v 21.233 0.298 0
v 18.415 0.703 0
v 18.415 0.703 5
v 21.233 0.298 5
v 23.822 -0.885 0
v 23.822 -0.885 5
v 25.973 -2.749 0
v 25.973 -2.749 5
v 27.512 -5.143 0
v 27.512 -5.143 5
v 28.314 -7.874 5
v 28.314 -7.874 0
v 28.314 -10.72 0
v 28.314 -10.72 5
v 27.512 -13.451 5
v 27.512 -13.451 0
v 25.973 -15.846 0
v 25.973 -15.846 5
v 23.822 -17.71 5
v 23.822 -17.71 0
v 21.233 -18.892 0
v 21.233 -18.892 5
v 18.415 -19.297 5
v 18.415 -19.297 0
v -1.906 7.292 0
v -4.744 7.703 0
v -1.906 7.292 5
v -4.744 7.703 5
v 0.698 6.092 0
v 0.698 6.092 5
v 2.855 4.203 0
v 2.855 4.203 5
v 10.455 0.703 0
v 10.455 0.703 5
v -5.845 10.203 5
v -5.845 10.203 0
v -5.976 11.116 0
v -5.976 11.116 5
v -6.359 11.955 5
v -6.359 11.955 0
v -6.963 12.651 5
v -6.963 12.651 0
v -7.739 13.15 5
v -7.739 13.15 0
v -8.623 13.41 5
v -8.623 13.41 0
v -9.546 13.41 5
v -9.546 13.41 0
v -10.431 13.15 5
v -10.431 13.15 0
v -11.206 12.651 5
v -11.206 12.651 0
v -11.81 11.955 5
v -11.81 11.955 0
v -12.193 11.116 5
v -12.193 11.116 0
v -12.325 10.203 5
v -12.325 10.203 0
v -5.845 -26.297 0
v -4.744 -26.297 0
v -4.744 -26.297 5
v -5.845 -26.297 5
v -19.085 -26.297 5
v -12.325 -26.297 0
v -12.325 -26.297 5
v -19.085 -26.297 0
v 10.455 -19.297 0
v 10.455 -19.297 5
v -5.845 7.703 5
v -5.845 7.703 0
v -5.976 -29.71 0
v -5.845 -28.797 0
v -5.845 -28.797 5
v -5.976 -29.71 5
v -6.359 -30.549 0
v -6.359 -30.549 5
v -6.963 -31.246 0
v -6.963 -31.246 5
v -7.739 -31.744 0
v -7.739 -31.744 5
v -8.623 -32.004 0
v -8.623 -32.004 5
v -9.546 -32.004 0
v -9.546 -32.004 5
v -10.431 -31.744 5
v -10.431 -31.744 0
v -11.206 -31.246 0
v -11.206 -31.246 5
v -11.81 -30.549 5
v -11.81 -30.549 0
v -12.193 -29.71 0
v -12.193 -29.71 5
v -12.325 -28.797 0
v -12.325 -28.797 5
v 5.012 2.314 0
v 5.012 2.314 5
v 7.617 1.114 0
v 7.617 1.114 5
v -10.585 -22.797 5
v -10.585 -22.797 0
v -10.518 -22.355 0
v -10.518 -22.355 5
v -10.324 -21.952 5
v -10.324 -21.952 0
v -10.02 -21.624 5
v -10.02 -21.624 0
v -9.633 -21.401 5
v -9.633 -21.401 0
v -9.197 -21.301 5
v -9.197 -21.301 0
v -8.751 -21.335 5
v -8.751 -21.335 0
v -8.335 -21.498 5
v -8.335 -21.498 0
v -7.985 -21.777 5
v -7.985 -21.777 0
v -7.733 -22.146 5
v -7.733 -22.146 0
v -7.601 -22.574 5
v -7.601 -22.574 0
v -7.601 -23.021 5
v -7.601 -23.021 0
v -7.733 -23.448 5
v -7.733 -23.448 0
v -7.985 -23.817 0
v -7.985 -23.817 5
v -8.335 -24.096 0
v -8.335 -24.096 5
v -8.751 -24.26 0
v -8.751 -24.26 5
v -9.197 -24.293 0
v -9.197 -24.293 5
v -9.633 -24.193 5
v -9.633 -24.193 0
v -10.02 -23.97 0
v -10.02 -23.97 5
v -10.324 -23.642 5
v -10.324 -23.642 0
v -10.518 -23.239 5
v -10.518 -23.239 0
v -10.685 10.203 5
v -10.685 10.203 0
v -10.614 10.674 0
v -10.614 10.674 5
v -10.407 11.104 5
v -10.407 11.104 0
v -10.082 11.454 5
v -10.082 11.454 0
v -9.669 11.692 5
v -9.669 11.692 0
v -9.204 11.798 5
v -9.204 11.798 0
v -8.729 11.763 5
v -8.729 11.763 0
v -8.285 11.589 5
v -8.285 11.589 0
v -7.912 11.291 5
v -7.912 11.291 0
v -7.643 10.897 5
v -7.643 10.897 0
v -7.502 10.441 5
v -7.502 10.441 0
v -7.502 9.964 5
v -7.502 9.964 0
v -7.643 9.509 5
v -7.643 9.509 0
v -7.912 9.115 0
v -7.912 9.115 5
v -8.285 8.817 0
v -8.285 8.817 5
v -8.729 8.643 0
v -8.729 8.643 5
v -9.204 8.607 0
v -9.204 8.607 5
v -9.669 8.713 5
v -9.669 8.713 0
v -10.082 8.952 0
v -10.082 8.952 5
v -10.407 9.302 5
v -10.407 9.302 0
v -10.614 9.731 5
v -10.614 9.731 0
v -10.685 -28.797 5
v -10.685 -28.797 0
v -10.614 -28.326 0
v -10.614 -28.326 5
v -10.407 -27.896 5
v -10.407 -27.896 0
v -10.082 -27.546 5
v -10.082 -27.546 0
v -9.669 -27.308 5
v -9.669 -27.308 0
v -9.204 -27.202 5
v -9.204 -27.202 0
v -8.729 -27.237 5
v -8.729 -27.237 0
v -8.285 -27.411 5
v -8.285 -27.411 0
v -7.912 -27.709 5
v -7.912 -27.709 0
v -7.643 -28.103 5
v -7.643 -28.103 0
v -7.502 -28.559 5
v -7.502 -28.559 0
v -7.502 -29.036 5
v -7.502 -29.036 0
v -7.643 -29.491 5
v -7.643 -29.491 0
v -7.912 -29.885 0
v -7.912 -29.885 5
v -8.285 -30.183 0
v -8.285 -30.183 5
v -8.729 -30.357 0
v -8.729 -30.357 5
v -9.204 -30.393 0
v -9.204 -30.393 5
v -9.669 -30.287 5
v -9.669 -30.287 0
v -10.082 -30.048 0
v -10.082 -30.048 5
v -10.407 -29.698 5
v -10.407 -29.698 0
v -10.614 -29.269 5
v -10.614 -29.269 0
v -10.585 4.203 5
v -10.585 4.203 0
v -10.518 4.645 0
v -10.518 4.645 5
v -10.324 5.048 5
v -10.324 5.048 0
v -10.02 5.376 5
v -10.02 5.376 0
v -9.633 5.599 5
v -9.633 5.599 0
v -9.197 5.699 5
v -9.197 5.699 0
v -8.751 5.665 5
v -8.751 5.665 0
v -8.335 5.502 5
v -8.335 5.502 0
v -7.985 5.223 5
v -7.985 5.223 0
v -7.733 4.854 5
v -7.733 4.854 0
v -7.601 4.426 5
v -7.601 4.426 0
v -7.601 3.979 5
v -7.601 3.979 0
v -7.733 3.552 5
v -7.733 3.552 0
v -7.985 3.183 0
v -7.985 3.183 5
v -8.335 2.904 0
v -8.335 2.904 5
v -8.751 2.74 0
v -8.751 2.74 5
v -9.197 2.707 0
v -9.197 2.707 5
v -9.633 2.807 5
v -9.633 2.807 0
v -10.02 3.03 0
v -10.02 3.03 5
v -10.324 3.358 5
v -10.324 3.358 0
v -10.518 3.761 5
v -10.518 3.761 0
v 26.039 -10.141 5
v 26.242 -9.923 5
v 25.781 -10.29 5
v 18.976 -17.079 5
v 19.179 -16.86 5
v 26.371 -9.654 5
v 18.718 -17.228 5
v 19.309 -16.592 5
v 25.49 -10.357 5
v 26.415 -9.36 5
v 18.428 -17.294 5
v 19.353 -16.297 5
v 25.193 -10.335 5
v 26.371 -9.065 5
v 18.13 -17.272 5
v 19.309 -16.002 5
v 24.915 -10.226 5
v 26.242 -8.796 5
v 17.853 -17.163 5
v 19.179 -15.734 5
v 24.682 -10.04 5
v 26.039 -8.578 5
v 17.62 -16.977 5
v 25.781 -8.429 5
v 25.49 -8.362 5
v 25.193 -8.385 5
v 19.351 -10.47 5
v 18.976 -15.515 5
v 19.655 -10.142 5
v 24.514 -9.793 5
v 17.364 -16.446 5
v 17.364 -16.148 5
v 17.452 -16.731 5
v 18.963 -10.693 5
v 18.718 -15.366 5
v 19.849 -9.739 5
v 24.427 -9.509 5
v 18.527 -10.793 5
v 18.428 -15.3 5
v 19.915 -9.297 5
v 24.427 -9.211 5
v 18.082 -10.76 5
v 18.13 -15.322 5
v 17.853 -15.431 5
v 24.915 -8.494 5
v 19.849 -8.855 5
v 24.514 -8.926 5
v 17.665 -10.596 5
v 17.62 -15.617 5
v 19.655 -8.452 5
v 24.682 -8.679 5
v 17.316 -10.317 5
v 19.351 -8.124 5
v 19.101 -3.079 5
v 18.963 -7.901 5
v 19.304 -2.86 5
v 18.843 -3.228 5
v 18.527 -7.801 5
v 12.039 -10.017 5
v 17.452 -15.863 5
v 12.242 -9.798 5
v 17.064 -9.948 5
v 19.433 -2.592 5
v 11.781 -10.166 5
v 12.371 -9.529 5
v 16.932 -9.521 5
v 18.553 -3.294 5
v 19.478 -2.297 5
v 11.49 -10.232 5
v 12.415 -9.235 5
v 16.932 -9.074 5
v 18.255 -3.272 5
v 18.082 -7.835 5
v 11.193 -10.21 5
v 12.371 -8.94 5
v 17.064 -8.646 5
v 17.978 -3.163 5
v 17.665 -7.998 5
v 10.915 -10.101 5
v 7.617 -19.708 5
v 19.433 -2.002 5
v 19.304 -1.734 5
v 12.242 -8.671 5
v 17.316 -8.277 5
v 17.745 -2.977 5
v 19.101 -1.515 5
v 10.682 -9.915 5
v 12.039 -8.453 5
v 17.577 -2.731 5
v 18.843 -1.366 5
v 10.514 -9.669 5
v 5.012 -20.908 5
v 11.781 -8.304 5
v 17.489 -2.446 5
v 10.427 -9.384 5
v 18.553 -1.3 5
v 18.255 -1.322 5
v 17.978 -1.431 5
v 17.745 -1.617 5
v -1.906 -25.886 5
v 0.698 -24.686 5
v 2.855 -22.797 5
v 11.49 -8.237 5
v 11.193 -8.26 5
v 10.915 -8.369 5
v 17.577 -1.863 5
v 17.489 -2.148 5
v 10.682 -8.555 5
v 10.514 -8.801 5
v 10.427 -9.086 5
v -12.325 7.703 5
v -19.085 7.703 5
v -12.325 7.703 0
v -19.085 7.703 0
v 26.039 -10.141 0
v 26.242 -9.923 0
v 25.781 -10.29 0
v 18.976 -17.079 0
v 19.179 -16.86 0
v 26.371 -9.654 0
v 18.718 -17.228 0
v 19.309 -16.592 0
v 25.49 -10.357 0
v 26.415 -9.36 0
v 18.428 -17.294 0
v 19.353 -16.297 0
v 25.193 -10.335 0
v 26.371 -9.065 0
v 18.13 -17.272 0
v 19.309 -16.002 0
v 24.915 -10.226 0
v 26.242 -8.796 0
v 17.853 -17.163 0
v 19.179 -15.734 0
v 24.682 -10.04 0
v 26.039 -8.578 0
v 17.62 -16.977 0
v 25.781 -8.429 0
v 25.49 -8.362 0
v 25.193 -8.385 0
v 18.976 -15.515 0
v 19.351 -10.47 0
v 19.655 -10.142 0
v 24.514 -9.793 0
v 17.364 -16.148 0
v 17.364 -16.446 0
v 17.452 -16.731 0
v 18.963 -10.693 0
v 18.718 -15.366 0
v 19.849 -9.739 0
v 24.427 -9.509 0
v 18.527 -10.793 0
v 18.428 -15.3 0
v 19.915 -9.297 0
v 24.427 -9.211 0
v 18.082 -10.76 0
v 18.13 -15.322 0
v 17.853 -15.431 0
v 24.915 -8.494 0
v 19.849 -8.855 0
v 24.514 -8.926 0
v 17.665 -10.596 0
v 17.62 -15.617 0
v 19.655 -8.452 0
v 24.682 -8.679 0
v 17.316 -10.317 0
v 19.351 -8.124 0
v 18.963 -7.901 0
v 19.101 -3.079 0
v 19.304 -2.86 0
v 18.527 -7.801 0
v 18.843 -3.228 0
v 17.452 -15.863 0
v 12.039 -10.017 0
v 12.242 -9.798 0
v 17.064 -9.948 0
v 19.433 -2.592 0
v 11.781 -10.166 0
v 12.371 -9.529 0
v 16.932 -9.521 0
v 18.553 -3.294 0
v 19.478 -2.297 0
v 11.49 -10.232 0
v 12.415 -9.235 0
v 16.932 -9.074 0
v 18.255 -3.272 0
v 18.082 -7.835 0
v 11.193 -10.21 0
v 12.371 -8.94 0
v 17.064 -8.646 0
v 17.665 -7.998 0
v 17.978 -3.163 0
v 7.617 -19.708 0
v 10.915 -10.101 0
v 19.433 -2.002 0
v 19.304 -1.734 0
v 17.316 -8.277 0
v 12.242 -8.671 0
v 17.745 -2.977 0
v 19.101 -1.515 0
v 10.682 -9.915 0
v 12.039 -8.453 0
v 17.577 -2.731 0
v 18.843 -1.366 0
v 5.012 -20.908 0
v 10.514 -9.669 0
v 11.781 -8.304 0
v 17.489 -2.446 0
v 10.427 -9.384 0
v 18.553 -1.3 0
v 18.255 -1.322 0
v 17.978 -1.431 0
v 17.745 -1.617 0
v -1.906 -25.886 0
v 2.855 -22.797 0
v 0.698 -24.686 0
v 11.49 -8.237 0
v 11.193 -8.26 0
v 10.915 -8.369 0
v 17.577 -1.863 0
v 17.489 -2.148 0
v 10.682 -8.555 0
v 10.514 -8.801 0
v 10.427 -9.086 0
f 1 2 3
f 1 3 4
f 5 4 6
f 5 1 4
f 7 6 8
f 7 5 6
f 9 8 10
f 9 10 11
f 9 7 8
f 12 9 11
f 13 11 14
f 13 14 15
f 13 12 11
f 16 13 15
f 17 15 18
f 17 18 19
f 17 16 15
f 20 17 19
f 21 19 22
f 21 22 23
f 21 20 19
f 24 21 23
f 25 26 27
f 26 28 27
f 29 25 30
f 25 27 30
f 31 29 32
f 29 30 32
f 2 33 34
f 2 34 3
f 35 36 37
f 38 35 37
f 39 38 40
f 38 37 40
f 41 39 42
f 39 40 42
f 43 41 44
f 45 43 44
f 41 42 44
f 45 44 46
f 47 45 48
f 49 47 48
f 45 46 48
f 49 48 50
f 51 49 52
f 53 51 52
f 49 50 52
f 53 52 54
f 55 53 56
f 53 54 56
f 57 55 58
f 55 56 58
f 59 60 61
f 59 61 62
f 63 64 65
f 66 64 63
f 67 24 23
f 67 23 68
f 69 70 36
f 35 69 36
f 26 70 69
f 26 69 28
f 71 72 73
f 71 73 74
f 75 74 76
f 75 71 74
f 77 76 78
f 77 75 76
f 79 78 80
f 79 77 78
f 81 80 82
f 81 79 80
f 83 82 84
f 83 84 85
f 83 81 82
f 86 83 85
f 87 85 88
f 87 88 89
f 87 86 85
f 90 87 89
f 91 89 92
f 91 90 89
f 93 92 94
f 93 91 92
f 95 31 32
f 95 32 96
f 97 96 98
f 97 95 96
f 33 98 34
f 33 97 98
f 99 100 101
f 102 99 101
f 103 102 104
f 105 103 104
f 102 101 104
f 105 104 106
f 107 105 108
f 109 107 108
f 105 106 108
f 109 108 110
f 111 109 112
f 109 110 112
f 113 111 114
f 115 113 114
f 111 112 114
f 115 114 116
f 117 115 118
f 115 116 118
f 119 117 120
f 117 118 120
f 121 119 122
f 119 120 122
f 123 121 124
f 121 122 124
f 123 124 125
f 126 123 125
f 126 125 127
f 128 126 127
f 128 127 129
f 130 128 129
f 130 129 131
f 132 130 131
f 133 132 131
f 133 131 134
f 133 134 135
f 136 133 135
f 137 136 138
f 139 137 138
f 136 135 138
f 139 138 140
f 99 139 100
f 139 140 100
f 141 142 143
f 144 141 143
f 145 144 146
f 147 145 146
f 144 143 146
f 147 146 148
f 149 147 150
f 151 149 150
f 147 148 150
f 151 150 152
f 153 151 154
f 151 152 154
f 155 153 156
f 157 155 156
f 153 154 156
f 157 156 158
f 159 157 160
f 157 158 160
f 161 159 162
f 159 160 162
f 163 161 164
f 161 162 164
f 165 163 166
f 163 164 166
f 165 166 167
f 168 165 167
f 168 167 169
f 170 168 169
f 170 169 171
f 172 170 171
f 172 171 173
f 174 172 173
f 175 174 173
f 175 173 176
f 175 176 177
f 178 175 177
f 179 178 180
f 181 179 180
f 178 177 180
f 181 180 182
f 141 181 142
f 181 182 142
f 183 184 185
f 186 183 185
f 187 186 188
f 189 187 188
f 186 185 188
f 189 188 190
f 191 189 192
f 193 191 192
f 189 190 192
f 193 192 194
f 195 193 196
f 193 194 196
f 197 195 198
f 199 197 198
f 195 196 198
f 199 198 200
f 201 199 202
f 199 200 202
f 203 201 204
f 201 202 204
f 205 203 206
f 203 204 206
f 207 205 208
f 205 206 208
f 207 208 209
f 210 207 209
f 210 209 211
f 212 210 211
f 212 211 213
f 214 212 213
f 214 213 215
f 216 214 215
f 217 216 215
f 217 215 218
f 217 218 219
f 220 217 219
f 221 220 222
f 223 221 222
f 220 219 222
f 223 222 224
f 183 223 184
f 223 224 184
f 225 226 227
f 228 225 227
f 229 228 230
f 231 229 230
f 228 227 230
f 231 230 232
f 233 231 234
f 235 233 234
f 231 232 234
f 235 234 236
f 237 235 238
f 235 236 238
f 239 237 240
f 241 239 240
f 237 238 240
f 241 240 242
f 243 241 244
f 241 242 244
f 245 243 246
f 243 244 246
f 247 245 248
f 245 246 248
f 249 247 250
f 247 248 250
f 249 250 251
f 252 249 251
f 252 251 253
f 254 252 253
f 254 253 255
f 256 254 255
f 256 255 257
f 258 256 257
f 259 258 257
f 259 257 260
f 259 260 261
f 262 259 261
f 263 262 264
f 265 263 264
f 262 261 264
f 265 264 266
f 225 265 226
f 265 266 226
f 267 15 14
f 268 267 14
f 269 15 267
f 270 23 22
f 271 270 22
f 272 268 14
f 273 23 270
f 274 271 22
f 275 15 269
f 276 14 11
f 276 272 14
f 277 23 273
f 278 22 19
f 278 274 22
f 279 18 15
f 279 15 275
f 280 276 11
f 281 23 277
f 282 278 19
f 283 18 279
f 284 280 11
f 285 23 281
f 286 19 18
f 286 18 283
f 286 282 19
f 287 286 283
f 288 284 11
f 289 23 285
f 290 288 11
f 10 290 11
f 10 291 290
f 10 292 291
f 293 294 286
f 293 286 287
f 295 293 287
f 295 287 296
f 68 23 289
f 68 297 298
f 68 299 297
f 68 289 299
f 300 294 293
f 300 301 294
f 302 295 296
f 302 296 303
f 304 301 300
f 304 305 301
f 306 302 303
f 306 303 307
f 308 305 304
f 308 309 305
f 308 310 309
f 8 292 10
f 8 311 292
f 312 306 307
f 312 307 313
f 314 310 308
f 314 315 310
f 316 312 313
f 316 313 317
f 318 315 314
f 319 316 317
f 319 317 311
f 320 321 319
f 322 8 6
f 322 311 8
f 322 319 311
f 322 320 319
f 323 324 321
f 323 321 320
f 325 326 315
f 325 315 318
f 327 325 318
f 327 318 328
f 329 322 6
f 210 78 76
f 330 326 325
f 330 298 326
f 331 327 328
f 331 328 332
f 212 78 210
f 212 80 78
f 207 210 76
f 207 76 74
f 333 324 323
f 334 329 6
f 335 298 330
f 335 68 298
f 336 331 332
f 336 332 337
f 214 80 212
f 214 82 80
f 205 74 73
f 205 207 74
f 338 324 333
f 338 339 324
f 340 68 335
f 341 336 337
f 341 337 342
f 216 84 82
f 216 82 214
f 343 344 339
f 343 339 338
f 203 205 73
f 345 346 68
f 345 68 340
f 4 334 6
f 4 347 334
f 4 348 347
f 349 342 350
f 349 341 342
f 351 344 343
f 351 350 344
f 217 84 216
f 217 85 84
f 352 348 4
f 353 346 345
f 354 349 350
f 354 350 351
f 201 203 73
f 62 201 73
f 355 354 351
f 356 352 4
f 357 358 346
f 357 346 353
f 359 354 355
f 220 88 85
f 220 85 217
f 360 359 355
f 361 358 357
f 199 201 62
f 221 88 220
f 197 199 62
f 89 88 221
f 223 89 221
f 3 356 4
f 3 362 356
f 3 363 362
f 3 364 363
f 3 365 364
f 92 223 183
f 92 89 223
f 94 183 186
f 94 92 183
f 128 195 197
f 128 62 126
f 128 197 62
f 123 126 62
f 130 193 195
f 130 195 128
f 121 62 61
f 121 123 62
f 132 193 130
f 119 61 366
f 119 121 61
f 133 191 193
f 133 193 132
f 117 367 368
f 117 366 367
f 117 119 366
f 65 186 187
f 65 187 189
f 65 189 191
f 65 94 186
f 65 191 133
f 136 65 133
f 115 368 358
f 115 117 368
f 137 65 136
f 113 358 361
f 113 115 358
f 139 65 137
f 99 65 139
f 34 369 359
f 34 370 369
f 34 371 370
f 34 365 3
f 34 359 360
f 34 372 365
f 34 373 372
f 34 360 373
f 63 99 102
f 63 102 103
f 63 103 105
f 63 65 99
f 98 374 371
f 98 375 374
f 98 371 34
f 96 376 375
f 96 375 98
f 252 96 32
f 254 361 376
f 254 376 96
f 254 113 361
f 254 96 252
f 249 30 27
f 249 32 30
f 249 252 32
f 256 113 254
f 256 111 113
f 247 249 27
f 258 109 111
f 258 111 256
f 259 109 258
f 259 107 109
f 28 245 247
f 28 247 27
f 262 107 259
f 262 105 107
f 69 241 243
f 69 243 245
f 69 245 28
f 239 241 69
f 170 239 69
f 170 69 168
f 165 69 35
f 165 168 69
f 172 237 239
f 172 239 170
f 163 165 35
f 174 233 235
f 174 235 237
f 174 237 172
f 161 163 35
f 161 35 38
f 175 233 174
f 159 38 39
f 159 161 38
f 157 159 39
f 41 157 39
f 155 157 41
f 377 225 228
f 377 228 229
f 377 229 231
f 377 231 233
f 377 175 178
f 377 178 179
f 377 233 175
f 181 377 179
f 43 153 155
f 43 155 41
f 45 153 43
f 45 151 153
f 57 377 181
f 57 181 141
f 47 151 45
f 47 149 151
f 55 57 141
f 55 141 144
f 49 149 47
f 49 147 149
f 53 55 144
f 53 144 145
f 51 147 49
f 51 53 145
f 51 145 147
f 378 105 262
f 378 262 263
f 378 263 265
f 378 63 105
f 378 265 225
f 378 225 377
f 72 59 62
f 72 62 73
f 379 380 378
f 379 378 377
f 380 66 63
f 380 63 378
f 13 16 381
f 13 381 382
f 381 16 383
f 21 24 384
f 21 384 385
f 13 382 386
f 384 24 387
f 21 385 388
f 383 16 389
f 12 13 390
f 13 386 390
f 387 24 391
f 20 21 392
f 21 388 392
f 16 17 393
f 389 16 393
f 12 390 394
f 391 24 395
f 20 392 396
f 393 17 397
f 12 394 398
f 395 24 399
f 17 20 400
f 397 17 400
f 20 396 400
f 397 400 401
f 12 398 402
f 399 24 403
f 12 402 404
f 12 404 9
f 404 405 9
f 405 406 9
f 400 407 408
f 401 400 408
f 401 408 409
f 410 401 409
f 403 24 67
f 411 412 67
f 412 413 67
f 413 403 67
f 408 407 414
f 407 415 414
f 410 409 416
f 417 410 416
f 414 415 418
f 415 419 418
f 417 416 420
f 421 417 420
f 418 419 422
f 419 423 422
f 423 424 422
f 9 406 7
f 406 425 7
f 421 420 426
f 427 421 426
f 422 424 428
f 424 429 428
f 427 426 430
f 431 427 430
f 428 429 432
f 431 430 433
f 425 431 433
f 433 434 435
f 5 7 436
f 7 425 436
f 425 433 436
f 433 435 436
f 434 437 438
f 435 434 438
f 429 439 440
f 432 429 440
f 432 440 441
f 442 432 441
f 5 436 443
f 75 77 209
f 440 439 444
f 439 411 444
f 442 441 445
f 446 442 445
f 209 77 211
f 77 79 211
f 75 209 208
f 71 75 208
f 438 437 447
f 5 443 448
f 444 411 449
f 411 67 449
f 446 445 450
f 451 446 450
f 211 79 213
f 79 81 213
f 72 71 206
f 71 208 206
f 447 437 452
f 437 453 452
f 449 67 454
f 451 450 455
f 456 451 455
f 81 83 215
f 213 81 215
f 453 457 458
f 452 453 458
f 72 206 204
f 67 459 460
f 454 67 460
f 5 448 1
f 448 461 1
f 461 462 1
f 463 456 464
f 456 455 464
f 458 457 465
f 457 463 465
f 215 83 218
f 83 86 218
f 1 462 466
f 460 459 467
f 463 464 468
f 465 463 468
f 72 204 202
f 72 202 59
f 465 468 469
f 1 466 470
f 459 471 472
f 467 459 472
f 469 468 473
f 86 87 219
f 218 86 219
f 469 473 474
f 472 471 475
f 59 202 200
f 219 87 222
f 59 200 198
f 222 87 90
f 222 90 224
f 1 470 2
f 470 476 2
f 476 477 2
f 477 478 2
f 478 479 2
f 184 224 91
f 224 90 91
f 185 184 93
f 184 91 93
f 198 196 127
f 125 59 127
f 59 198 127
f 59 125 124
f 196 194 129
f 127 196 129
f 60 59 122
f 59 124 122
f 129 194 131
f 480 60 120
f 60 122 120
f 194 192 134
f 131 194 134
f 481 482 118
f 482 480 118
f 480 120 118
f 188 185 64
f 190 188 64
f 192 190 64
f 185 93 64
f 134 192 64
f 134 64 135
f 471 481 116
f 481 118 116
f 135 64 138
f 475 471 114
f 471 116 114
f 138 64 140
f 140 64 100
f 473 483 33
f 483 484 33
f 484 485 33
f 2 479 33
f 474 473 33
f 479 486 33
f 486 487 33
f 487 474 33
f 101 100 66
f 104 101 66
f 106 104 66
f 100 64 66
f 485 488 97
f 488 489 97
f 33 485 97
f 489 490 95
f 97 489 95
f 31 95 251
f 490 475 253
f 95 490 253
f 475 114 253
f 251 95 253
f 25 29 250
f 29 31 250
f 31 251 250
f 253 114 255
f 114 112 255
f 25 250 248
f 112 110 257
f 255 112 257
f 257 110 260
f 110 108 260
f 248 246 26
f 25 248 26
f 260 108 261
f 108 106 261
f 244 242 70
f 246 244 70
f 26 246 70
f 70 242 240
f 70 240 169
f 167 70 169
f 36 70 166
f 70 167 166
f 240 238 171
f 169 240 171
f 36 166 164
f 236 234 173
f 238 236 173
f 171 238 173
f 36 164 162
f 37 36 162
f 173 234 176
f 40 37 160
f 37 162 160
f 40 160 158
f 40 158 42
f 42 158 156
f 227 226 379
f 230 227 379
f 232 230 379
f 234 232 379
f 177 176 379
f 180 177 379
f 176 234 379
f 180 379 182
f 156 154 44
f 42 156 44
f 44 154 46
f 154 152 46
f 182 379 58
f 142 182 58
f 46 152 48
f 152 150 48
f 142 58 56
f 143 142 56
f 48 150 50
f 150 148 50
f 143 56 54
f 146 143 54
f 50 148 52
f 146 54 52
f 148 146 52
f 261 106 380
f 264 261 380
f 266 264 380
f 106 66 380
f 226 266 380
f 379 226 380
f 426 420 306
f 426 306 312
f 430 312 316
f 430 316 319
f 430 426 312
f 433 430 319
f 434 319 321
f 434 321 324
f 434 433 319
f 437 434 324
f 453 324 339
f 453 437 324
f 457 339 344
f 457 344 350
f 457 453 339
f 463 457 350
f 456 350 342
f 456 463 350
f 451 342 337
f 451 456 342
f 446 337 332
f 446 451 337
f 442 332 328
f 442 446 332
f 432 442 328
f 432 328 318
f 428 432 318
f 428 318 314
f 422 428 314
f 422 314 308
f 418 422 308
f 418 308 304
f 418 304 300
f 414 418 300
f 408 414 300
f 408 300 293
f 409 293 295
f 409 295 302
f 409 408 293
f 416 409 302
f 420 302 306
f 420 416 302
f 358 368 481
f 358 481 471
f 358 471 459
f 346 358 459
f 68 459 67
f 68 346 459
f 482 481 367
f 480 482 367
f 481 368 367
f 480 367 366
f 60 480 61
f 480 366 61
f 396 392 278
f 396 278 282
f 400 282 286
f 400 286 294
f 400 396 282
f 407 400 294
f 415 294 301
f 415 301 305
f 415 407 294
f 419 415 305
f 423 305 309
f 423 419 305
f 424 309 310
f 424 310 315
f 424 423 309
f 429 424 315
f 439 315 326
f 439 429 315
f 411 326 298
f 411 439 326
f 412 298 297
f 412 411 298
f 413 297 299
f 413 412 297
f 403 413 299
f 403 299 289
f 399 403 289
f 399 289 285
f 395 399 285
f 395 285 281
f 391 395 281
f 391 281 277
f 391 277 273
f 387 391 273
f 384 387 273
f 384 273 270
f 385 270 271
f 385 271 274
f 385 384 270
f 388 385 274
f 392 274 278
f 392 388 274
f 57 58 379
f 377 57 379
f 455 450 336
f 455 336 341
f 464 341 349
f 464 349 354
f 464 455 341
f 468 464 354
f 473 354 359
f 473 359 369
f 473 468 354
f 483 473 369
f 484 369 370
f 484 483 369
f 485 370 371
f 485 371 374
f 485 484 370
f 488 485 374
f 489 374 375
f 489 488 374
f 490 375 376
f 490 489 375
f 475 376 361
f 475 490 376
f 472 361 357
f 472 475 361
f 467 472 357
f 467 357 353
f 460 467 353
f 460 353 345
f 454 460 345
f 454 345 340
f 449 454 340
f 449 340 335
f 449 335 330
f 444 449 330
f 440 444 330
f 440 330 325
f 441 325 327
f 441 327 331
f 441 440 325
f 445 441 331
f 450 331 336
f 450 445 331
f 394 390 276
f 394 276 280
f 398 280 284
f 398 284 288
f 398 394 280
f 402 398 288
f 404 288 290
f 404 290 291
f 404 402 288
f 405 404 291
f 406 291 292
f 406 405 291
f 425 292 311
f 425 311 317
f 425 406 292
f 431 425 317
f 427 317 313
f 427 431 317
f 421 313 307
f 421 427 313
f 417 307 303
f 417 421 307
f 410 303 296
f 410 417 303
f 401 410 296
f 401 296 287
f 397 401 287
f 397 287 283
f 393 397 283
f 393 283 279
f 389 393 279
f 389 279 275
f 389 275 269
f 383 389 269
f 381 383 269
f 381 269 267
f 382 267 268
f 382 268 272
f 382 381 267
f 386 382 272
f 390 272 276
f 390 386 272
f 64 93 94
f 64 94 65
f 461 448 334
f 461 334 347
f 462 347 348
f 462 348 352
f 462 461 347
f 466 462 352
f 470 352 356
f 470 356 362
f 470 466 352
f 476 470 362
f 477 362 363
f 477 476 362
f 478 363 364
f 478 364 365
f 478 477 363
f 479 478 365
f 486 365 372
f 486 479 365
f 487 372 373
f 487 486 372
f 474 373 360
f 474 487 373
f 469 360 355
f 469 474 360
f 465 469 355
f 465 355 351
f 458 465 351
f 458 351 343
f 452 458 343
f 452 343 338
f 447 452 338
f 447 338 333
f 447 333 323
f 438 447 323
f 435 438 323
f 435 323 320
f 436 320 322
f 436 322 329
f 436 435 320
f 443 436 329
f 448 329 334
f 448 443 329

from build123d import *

# Parameters (mm, degrees)
ESQUISSE1_R             = 1
ESQUISSE1_R_2           = 1.5
BOSS_EXTRU_1_DEPTH      = 5
ENL_V_MAT_EXTRU_1_DEPTH = 5
ESQUISSE3_W             = 20
ESQUISSE3_H             = 34
BOSS_EXTRU_2_DEPTH      = 5
ESQUISSE4_R             = 1.5
ESQUISSE4_W             = 9.798464728
ESQUISSE4_H             = 39.858161606
ENL_V_MAT_EXTRU_2_DEPTH = 5
ESQUISSE5_W             = 2.5
ESQUISSE5_H             = 34
BOSS_EXTRU_3_DEPTH      = 5
ESQUISSE6_R             = 1.6
BOSS_EXTRU_4_DEPTH      = 5
CONG_1_R                = 10
CONG_2_R                = 10


with BuildPart() as part:
    # Esquisse1 → Boss.-Extru.1 (new body)
    with BuildSketch(Plane.XY):
        with BuildLine():
            Line((-13.584596858, -30.047129187), (-13.584596858, -25.547129187))
            Line((-13.584596858, -25.547129187), (-13.584596858, -25.297129187))
            Line((-13.584596858, -25.297129187), (-13.834596858, -25.297129187))
            Line((-13.834596858, -25.297129187), (-16.334596858, -25.297129187))
            Line((-16.334596858, -25.297129187), (-16.584596858, -25.297129187))
            Line((-16.584596858, -25.297129187), (-16.584596858, -25.047129187))
            Line((-16.584596858, -25.047129187), (-16.584596858, 6.452870813))
            Line((-16.584596858, 6.452870813), (-16.584596858, 6.702870813))
            Line((-16.584596858, 6.702870813), (-16.334596858, 6.702870813))
            Line((-16.334596858, 6.702870813), (-13.834596858, 6.702870813))
            Line((-13.834596858, 6.702870813), (-13.584596858, 6.702870813))
            Line((-13.584596858, 6.702870813), (-13.584596858, 6.952870813))
            Line((-13.584596858, 6.952870813), (-13.584596858, 11.452870813))
            Line((-13.584596858, 11.452870813), (-13.584596858, 11.702870813))
            Line((-13.584596858, 11.702870813), (-13.334596858, 11.702870813))
            Line((-13.334596858, 11.702870813), (-8.584596858, 11.702870813))
            Line((-8.584596858, 11.702870813), (-8.584596858, 6.702870813))
            Line((-8.584596858, 6.702870813), (-7.491776281, 6.702870813))
            Line((-7.491776281, 6.702870813), (-4.034541178, 6.702870813))
            ThreePointArc((-4.034541178, 6.702870813), (-0.161557832, 6.19424756), (3.448773595, 4.702870813))
            ThreePointArc((3.448773595, 4.702870813), (10.66943645, 1.720117321), (18.415403142, 0.702870813))
            ThreePointArc((18.415403142, 0.702870813), (28.415403142, -9.297129187), (18.415403142, -19.297129187))
            ThreePointArc((18.415403142, -19.297129187), (10.66943645, -20.314375694), (3.448773595, -23.297129187))
            ThreePointArc((3.448773595, -23.297129187), (-0.161557832, -24.788505933), (-4.034541178, -25.297129187))
            Line((-4.034541178, -25.297129187), (-7.491776281, -25.297129187))
            Line((-7.491776281, -25.297129187), (-8.584596858, -25.297129187))
            Line((-8.584596858, -25.297129187), (-8.584596858, -30.297129187))
            Line((-8.584596858, -30.297129187), (-13.334596858, -30.297129187))
            Line((-13.334596858, -30.297129187), (-13.584596858, -30.297129187))
            Line((-13.584596858, -30.297129187), (-13.584596858, -30.047129187))
        make_face()
        with Locations((18.477857718, -2.297129187)):
            Circle(ESQUISSE1_R, mode=Mode.SUBTRACT)
        with Locations((25.415403142, -9.359583762)):
            Circle(ESQUISSE1_R, mode=Mode.SUBTRACT)
        with Locations((18.415403142, -9.297129187)):
            Circle(ESQUISSE1_R_2, mode=Mode.SUBTRACT)
        with Locations((11.415403142, -9.234674611)):
            Circle(ESQUISSE1_R, mode=Mode.SUBTRACT)
        with Locations((18.352948567, -16.297129187)):
            Circle(ESQUISSE1_R, mode=Mode.SUBTRACT)
    extrude(amount=BOSS_EXTRU_1_DEPTH)

    # Esquisse2 → Enlèv. mat.-Extru.1 (cut)
    with BuildSketch(Plane(origin=(0, 0, 0), x_dir=(-1, 0, 0), z_dir=(0, 0, -1))):
        Polygon((1.584596858, -19.297129187), (1.584596858, -25.297129187), (1.584596858, -26.297129187), (21.584596858, -26.297129187), (21.584596858, -33.65697819), (-26.833247513, -33.65697819), (-26.198667142, -19.297129187), align=None)
        Polygon((21.584596858, 7.702870813), (1.584596858, 7.702870813), (1.584596858, 6.702870813), (1.584596858, 0.702870813), (-26.198667142, 0.702870813), (-26.833247513, 15.062719816), (21.584596858, 15.062719816), align=None)
    extrude(amount=-ENL_V_MAT_EXTRU_1_DEPTH, mode=Mode.SUBTRACT)

    # Esquisse3 → Boss.-Extru.2 (add)
    with BuildSketch(Plane(origin=(0, 0, 0), x_dir=(-1, 0, 0), z_dir=(0, 0, -1))):
        with Locations((11.584596858, -9.297129187)):
            Rectangle(ESQUISSE3_W, ESQUISSE3_H)
    extrude(amount=-BOSS_EXTRU_2_DEPTH)

    # Esquisse4 → Enlèv. mat.-Extru.2 (cut)
    with BuildSketch(Plane(origin=(0, 0, 0), x_dir=(-1, 0, 0), z_dir=(0, 0, -1))):
        with Locations((9.084596858, -22.797129187)):
            Circle(ESQUISSE4_R)
        with Locations((9.084596858, 4.202870813)):
            Circle(ESQUISSE4_R)
        with Locations((23.983829222, -9.020336398)):
            Rectangle(ESQUISSE4_W, ESQUISSE4_H)
    extrude(amount=-ENL_V_MAT_EXTRU_2_DEPTH, mode=Mode.SUBTRACT)

    # Esquisse5 → Boss.-Extru.3 (add)
    with BuildSketch(Plane(origin=(0, 0, 0), x_dir=(-1, 0, 0), z_dir=(0, 0, -1))):
        with Locations((0.334596858, -9.297129187)):
            Rectangle(ESQUISSE5_W, ESQUISSE5_H)
    extrude(amount=-BOSS_EXTRU_3_DEPTH)

    # Esquisse6 → Boss.-Extru.4 (add)
    # profile 1 of 2: a face of its own
    with BuildSketch(Plane(origin=(0, 0, 0), x_dir=(-1, 0, 0), z_dir=(0, 0, -1))):
        with BuildLine():
            Line((12.324596858, -25.12480516), (5.844596858, -25.12480516))
            Line((5.844596858, -25.12480516), (5.844596858, -28.797129187))
            ThreePointArc((5.844596858, -28.797129187), (9.084596858, -32.037129187), (12.324596858, -28.797129187))
            Line((12.324596858, -28.797129187), (12.324596858, -25.12480516))
        make_face()
        with Locations((9.084596858, -28.797129187)):
            Circle(ESQUISSE6_R, mode=Mode.SUBTRACT)
    # profile 2 of 2: a face of its own
    with BuildSketch(Plane(origin=(0, 0, 0), x_dir=(-1, 0, 0), z_dir=(0, 0, -1))):
        with BuildLine():
            Line((12.324596858, 6.757738308), (5.844596858, 6.757738308))
            Line((5.844596858, 6.757738308), (5.844596858, 10.202870813))
            ThreePointArc((5.844596858, 10.202870813), (9.084596858, 13.442870813), (12.324596858, 10.202870813))
            Line((12.324596858, 10.202870813), (12.324596858, 6.757738308))
        make_face()
        with Locations((9.084596858, 10.202870813)):
            Circle(ESQUISSE6_R, mode=Mode.SUBTRACT)
    extrude(amount=-BOSS_EXTRU_4_DEPTH)

    # Congé1
    # the kernel refuses this fillet: 10 mm, written as the material it adds along each edge
    with BuildSketch(Plane(origin=(0.915403142, 0.702870813, 0), x_dir=(1, 0, 0), z_dir=(0, 0, 1))) as cong_1_piece_1:
        with BuildLine():
            CenterArc((9.539392014, 10), CONG_1_R, 197.457603124, 72.542396876)
            Line((0, 7), (-0.19078784, 6.94))
            ThreePointArc((-0.19078784, 6.94), (-0.2, 3.5), (-0.2, 0))
            Line((-0.2, 0), (0, -0.2))
            Line((0, -0.2), (9.539392014, -0.2))
            Line((9.539392014, -0.2), (9.539392014, 0))
        make_face()
    extrude(amount=5)
    with BuildSketch(Plane(origin=(0.915403142, -19.297129187, 5), x_dir=(0, -1, 0), z_dir=(0, 0, -1))) as cong_1_piece_2:
        with BuildLine():
            CenterArc((10, -9.539392014), CONG_1_R, 107.457603124, 72.542396876)
            Line((0, -9.539392014), (-0.2, -9.539392014))
            Line((-0.2, -9.539392014), (-0.2, 0))
            Line((-0.2, 0), (0, 0.2))
            ThreePointArc((0, 0.2), (3.5, 0.2), (6.94, 0.19078784))
            Line((6.94, 0.19078784), (7, 0))
        make_face()
    extrude(amount=5)

    # Congé2
    cong_2_edges = [part.edges().sort_by_distance(p)[0] for p in [
        (0.915403142, -26.297129187, 2.5),
        (0.915403142, 7.702870813, 2.5),
    ]]
    fillet(cong_2_edges, radius=CONG_2_R)


solid = part.part
